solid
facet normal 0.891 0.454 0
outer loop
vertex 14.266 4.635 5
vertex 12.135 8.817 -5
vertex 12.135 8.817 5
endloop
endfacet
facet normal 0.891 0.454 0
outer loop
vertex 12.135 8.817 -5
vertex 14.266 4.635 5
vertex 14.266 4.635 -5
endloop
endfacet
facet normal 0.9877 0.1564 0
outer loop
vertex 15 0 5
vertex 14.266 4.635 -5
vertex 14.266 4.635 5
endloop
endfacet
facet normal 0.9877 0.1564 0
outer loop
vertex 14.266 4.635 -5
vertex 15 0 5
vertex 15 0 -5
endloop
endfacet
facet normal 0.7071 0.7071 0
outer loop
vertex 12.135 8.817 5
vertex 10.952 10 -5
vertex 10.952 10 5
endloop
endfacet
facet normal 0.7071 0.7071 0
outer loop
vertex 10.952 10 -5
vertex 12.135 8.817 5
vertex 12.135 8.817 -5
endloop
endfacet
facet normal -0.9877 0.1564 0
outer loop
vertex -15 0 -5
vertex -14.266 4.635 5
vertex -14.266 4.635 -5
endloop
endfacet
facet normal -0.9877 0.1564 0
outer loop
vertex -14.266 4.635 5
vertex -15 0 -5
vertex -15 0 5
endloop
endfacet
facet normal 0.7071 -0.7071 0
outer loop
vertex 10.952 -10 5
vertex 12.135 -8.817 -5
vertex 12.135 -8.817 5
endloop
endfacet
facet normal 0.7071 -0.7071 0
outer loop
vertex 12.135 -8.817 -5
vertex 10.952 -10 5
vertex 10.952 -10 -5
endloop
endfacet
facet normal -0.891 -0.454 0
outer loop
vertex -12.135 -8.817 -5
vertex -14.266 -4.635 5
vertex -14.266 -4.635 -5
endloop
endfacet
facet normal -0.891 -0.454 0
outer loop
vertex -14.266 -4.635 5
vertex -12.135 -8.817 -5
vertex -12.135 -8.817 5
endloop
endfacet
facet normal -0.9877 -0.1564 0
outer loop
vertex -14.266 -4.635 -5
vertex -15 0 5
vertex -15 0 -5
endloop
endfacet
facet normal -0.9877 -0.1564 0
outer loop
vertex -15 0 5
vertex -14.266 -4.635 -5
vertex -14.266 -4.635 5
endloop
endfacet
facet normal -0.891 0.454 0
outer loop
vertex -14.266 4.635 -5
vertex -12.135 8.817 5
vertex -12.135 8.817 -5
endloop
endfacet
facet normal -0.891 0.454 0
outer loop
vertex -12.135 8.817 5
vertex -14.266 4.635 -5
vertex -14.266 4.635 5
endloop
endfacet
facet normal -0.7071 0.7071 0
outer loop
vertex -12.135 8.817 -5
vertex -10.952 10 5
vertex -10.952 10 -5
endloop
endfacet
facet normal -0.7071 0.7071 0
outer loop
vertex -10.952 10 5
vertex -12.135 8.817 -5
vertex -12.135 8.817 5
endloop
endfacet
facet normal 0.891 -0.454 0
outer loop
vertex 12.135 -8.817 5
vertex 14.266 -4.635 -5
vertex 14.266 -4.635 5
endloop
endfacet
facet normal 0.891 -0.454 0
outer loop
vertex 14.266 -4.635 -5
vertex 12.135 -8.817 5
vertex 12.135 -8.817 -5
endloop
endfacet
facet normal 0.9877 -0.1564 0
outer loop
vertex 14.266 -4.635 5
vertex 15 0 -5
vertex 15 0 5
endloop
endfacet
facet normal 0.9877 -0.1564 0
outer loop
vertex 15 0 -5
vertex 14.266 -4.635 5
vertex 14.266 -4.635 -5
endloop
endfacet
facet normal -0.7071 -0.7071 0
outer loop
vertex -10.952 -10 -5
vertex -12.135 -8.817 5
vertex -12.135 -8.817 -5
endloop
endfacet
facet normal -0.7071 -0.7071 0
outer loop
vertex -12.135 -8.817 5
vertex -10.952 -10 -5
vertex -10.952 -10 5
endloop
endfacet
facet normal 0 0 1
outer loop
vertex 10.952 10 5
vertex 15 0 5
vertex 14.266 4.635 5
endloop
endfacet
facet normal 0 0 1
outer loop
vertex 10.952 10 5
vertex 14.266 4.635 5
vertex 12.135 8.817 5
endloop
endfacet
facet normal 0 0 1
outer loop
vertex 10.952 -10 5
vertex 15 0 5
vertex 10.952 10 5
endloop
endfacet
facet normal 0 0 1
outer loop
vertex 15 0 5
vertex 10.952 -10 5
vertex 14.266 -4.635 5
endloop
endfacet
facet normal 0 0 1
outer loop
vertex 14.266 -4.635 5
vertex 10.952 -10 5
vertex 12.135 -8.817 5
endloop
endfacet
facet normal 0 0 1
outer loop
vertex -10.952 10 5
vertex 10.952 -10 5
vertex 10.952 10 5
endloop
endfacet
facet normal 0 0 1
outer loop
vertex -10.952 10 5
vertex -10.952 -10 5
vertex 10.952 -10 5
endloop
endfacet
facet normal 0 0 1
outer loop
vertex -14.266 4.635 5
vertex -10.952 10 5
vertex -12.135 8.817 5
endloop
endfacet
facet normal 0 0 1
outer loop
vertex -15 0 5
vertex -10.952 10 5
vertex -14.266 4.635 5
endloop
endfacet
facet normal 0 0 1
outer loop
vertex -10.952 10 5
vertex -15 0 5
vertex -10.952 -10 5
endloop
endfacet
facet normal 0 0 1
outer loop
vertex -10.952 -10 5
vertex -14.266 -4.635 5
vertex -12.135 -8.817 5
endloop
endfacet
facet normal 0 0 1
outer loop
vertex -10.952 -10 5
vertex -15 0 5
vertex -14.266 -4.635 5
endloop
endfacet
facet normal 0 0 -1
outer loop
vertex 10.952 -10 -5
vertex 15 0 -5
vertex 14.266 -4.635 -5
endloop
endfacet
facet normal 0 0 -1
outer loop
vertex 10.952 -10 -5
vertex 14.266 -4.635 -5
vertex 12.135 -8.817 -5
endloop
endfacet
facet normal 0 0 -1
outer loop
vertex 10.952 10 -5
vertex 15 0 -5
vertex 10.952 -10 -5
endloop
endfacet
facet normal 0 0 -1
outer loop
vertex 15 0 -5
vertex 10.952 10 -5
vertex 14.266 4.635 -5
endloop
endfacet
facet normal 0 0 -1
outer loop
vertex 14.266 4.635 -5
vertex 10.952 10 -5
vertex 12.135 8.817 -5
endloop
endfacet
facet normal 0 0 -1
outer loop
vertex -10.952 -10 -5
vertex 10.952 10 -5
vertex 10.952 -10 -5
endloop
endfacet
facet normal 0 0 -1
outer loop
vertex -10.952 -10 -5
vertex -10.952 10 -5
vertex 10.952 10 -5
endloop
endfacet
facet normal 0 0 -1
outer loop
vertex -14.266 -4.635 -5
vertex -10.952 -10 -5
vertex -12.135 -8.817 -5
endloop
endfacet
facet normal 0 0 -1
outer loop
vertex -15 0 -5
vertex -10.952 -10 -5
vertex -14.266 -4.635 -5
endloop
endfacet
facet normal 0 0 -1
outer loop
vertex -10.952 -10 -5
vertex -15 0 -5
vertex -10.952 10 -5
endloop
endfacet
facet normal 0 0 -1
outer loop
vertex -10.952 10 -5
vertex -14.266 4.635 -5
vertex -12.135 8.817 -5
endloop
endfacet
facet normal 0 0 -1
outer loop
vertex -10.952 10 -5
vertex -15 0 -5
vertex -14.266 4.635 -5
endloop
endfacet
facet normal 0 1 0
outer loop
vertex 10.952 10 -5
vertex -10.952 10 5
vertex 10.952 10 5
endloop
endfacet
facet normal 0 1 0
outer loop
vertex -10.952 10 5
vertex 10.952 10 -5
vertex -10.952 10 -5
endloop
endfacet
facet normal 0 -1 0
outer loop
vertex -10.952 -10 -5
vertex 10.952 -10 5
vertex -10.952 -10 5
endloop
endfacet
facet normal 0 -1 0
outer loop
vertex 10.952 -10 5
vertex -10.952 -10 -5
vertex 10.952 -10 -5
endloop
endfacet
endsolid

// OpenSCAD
intersection()
{
  cylinder(h=20, r=15,
    center=true, $fn=20);
  cube(size=[30,20,10],
    center=true);
}
